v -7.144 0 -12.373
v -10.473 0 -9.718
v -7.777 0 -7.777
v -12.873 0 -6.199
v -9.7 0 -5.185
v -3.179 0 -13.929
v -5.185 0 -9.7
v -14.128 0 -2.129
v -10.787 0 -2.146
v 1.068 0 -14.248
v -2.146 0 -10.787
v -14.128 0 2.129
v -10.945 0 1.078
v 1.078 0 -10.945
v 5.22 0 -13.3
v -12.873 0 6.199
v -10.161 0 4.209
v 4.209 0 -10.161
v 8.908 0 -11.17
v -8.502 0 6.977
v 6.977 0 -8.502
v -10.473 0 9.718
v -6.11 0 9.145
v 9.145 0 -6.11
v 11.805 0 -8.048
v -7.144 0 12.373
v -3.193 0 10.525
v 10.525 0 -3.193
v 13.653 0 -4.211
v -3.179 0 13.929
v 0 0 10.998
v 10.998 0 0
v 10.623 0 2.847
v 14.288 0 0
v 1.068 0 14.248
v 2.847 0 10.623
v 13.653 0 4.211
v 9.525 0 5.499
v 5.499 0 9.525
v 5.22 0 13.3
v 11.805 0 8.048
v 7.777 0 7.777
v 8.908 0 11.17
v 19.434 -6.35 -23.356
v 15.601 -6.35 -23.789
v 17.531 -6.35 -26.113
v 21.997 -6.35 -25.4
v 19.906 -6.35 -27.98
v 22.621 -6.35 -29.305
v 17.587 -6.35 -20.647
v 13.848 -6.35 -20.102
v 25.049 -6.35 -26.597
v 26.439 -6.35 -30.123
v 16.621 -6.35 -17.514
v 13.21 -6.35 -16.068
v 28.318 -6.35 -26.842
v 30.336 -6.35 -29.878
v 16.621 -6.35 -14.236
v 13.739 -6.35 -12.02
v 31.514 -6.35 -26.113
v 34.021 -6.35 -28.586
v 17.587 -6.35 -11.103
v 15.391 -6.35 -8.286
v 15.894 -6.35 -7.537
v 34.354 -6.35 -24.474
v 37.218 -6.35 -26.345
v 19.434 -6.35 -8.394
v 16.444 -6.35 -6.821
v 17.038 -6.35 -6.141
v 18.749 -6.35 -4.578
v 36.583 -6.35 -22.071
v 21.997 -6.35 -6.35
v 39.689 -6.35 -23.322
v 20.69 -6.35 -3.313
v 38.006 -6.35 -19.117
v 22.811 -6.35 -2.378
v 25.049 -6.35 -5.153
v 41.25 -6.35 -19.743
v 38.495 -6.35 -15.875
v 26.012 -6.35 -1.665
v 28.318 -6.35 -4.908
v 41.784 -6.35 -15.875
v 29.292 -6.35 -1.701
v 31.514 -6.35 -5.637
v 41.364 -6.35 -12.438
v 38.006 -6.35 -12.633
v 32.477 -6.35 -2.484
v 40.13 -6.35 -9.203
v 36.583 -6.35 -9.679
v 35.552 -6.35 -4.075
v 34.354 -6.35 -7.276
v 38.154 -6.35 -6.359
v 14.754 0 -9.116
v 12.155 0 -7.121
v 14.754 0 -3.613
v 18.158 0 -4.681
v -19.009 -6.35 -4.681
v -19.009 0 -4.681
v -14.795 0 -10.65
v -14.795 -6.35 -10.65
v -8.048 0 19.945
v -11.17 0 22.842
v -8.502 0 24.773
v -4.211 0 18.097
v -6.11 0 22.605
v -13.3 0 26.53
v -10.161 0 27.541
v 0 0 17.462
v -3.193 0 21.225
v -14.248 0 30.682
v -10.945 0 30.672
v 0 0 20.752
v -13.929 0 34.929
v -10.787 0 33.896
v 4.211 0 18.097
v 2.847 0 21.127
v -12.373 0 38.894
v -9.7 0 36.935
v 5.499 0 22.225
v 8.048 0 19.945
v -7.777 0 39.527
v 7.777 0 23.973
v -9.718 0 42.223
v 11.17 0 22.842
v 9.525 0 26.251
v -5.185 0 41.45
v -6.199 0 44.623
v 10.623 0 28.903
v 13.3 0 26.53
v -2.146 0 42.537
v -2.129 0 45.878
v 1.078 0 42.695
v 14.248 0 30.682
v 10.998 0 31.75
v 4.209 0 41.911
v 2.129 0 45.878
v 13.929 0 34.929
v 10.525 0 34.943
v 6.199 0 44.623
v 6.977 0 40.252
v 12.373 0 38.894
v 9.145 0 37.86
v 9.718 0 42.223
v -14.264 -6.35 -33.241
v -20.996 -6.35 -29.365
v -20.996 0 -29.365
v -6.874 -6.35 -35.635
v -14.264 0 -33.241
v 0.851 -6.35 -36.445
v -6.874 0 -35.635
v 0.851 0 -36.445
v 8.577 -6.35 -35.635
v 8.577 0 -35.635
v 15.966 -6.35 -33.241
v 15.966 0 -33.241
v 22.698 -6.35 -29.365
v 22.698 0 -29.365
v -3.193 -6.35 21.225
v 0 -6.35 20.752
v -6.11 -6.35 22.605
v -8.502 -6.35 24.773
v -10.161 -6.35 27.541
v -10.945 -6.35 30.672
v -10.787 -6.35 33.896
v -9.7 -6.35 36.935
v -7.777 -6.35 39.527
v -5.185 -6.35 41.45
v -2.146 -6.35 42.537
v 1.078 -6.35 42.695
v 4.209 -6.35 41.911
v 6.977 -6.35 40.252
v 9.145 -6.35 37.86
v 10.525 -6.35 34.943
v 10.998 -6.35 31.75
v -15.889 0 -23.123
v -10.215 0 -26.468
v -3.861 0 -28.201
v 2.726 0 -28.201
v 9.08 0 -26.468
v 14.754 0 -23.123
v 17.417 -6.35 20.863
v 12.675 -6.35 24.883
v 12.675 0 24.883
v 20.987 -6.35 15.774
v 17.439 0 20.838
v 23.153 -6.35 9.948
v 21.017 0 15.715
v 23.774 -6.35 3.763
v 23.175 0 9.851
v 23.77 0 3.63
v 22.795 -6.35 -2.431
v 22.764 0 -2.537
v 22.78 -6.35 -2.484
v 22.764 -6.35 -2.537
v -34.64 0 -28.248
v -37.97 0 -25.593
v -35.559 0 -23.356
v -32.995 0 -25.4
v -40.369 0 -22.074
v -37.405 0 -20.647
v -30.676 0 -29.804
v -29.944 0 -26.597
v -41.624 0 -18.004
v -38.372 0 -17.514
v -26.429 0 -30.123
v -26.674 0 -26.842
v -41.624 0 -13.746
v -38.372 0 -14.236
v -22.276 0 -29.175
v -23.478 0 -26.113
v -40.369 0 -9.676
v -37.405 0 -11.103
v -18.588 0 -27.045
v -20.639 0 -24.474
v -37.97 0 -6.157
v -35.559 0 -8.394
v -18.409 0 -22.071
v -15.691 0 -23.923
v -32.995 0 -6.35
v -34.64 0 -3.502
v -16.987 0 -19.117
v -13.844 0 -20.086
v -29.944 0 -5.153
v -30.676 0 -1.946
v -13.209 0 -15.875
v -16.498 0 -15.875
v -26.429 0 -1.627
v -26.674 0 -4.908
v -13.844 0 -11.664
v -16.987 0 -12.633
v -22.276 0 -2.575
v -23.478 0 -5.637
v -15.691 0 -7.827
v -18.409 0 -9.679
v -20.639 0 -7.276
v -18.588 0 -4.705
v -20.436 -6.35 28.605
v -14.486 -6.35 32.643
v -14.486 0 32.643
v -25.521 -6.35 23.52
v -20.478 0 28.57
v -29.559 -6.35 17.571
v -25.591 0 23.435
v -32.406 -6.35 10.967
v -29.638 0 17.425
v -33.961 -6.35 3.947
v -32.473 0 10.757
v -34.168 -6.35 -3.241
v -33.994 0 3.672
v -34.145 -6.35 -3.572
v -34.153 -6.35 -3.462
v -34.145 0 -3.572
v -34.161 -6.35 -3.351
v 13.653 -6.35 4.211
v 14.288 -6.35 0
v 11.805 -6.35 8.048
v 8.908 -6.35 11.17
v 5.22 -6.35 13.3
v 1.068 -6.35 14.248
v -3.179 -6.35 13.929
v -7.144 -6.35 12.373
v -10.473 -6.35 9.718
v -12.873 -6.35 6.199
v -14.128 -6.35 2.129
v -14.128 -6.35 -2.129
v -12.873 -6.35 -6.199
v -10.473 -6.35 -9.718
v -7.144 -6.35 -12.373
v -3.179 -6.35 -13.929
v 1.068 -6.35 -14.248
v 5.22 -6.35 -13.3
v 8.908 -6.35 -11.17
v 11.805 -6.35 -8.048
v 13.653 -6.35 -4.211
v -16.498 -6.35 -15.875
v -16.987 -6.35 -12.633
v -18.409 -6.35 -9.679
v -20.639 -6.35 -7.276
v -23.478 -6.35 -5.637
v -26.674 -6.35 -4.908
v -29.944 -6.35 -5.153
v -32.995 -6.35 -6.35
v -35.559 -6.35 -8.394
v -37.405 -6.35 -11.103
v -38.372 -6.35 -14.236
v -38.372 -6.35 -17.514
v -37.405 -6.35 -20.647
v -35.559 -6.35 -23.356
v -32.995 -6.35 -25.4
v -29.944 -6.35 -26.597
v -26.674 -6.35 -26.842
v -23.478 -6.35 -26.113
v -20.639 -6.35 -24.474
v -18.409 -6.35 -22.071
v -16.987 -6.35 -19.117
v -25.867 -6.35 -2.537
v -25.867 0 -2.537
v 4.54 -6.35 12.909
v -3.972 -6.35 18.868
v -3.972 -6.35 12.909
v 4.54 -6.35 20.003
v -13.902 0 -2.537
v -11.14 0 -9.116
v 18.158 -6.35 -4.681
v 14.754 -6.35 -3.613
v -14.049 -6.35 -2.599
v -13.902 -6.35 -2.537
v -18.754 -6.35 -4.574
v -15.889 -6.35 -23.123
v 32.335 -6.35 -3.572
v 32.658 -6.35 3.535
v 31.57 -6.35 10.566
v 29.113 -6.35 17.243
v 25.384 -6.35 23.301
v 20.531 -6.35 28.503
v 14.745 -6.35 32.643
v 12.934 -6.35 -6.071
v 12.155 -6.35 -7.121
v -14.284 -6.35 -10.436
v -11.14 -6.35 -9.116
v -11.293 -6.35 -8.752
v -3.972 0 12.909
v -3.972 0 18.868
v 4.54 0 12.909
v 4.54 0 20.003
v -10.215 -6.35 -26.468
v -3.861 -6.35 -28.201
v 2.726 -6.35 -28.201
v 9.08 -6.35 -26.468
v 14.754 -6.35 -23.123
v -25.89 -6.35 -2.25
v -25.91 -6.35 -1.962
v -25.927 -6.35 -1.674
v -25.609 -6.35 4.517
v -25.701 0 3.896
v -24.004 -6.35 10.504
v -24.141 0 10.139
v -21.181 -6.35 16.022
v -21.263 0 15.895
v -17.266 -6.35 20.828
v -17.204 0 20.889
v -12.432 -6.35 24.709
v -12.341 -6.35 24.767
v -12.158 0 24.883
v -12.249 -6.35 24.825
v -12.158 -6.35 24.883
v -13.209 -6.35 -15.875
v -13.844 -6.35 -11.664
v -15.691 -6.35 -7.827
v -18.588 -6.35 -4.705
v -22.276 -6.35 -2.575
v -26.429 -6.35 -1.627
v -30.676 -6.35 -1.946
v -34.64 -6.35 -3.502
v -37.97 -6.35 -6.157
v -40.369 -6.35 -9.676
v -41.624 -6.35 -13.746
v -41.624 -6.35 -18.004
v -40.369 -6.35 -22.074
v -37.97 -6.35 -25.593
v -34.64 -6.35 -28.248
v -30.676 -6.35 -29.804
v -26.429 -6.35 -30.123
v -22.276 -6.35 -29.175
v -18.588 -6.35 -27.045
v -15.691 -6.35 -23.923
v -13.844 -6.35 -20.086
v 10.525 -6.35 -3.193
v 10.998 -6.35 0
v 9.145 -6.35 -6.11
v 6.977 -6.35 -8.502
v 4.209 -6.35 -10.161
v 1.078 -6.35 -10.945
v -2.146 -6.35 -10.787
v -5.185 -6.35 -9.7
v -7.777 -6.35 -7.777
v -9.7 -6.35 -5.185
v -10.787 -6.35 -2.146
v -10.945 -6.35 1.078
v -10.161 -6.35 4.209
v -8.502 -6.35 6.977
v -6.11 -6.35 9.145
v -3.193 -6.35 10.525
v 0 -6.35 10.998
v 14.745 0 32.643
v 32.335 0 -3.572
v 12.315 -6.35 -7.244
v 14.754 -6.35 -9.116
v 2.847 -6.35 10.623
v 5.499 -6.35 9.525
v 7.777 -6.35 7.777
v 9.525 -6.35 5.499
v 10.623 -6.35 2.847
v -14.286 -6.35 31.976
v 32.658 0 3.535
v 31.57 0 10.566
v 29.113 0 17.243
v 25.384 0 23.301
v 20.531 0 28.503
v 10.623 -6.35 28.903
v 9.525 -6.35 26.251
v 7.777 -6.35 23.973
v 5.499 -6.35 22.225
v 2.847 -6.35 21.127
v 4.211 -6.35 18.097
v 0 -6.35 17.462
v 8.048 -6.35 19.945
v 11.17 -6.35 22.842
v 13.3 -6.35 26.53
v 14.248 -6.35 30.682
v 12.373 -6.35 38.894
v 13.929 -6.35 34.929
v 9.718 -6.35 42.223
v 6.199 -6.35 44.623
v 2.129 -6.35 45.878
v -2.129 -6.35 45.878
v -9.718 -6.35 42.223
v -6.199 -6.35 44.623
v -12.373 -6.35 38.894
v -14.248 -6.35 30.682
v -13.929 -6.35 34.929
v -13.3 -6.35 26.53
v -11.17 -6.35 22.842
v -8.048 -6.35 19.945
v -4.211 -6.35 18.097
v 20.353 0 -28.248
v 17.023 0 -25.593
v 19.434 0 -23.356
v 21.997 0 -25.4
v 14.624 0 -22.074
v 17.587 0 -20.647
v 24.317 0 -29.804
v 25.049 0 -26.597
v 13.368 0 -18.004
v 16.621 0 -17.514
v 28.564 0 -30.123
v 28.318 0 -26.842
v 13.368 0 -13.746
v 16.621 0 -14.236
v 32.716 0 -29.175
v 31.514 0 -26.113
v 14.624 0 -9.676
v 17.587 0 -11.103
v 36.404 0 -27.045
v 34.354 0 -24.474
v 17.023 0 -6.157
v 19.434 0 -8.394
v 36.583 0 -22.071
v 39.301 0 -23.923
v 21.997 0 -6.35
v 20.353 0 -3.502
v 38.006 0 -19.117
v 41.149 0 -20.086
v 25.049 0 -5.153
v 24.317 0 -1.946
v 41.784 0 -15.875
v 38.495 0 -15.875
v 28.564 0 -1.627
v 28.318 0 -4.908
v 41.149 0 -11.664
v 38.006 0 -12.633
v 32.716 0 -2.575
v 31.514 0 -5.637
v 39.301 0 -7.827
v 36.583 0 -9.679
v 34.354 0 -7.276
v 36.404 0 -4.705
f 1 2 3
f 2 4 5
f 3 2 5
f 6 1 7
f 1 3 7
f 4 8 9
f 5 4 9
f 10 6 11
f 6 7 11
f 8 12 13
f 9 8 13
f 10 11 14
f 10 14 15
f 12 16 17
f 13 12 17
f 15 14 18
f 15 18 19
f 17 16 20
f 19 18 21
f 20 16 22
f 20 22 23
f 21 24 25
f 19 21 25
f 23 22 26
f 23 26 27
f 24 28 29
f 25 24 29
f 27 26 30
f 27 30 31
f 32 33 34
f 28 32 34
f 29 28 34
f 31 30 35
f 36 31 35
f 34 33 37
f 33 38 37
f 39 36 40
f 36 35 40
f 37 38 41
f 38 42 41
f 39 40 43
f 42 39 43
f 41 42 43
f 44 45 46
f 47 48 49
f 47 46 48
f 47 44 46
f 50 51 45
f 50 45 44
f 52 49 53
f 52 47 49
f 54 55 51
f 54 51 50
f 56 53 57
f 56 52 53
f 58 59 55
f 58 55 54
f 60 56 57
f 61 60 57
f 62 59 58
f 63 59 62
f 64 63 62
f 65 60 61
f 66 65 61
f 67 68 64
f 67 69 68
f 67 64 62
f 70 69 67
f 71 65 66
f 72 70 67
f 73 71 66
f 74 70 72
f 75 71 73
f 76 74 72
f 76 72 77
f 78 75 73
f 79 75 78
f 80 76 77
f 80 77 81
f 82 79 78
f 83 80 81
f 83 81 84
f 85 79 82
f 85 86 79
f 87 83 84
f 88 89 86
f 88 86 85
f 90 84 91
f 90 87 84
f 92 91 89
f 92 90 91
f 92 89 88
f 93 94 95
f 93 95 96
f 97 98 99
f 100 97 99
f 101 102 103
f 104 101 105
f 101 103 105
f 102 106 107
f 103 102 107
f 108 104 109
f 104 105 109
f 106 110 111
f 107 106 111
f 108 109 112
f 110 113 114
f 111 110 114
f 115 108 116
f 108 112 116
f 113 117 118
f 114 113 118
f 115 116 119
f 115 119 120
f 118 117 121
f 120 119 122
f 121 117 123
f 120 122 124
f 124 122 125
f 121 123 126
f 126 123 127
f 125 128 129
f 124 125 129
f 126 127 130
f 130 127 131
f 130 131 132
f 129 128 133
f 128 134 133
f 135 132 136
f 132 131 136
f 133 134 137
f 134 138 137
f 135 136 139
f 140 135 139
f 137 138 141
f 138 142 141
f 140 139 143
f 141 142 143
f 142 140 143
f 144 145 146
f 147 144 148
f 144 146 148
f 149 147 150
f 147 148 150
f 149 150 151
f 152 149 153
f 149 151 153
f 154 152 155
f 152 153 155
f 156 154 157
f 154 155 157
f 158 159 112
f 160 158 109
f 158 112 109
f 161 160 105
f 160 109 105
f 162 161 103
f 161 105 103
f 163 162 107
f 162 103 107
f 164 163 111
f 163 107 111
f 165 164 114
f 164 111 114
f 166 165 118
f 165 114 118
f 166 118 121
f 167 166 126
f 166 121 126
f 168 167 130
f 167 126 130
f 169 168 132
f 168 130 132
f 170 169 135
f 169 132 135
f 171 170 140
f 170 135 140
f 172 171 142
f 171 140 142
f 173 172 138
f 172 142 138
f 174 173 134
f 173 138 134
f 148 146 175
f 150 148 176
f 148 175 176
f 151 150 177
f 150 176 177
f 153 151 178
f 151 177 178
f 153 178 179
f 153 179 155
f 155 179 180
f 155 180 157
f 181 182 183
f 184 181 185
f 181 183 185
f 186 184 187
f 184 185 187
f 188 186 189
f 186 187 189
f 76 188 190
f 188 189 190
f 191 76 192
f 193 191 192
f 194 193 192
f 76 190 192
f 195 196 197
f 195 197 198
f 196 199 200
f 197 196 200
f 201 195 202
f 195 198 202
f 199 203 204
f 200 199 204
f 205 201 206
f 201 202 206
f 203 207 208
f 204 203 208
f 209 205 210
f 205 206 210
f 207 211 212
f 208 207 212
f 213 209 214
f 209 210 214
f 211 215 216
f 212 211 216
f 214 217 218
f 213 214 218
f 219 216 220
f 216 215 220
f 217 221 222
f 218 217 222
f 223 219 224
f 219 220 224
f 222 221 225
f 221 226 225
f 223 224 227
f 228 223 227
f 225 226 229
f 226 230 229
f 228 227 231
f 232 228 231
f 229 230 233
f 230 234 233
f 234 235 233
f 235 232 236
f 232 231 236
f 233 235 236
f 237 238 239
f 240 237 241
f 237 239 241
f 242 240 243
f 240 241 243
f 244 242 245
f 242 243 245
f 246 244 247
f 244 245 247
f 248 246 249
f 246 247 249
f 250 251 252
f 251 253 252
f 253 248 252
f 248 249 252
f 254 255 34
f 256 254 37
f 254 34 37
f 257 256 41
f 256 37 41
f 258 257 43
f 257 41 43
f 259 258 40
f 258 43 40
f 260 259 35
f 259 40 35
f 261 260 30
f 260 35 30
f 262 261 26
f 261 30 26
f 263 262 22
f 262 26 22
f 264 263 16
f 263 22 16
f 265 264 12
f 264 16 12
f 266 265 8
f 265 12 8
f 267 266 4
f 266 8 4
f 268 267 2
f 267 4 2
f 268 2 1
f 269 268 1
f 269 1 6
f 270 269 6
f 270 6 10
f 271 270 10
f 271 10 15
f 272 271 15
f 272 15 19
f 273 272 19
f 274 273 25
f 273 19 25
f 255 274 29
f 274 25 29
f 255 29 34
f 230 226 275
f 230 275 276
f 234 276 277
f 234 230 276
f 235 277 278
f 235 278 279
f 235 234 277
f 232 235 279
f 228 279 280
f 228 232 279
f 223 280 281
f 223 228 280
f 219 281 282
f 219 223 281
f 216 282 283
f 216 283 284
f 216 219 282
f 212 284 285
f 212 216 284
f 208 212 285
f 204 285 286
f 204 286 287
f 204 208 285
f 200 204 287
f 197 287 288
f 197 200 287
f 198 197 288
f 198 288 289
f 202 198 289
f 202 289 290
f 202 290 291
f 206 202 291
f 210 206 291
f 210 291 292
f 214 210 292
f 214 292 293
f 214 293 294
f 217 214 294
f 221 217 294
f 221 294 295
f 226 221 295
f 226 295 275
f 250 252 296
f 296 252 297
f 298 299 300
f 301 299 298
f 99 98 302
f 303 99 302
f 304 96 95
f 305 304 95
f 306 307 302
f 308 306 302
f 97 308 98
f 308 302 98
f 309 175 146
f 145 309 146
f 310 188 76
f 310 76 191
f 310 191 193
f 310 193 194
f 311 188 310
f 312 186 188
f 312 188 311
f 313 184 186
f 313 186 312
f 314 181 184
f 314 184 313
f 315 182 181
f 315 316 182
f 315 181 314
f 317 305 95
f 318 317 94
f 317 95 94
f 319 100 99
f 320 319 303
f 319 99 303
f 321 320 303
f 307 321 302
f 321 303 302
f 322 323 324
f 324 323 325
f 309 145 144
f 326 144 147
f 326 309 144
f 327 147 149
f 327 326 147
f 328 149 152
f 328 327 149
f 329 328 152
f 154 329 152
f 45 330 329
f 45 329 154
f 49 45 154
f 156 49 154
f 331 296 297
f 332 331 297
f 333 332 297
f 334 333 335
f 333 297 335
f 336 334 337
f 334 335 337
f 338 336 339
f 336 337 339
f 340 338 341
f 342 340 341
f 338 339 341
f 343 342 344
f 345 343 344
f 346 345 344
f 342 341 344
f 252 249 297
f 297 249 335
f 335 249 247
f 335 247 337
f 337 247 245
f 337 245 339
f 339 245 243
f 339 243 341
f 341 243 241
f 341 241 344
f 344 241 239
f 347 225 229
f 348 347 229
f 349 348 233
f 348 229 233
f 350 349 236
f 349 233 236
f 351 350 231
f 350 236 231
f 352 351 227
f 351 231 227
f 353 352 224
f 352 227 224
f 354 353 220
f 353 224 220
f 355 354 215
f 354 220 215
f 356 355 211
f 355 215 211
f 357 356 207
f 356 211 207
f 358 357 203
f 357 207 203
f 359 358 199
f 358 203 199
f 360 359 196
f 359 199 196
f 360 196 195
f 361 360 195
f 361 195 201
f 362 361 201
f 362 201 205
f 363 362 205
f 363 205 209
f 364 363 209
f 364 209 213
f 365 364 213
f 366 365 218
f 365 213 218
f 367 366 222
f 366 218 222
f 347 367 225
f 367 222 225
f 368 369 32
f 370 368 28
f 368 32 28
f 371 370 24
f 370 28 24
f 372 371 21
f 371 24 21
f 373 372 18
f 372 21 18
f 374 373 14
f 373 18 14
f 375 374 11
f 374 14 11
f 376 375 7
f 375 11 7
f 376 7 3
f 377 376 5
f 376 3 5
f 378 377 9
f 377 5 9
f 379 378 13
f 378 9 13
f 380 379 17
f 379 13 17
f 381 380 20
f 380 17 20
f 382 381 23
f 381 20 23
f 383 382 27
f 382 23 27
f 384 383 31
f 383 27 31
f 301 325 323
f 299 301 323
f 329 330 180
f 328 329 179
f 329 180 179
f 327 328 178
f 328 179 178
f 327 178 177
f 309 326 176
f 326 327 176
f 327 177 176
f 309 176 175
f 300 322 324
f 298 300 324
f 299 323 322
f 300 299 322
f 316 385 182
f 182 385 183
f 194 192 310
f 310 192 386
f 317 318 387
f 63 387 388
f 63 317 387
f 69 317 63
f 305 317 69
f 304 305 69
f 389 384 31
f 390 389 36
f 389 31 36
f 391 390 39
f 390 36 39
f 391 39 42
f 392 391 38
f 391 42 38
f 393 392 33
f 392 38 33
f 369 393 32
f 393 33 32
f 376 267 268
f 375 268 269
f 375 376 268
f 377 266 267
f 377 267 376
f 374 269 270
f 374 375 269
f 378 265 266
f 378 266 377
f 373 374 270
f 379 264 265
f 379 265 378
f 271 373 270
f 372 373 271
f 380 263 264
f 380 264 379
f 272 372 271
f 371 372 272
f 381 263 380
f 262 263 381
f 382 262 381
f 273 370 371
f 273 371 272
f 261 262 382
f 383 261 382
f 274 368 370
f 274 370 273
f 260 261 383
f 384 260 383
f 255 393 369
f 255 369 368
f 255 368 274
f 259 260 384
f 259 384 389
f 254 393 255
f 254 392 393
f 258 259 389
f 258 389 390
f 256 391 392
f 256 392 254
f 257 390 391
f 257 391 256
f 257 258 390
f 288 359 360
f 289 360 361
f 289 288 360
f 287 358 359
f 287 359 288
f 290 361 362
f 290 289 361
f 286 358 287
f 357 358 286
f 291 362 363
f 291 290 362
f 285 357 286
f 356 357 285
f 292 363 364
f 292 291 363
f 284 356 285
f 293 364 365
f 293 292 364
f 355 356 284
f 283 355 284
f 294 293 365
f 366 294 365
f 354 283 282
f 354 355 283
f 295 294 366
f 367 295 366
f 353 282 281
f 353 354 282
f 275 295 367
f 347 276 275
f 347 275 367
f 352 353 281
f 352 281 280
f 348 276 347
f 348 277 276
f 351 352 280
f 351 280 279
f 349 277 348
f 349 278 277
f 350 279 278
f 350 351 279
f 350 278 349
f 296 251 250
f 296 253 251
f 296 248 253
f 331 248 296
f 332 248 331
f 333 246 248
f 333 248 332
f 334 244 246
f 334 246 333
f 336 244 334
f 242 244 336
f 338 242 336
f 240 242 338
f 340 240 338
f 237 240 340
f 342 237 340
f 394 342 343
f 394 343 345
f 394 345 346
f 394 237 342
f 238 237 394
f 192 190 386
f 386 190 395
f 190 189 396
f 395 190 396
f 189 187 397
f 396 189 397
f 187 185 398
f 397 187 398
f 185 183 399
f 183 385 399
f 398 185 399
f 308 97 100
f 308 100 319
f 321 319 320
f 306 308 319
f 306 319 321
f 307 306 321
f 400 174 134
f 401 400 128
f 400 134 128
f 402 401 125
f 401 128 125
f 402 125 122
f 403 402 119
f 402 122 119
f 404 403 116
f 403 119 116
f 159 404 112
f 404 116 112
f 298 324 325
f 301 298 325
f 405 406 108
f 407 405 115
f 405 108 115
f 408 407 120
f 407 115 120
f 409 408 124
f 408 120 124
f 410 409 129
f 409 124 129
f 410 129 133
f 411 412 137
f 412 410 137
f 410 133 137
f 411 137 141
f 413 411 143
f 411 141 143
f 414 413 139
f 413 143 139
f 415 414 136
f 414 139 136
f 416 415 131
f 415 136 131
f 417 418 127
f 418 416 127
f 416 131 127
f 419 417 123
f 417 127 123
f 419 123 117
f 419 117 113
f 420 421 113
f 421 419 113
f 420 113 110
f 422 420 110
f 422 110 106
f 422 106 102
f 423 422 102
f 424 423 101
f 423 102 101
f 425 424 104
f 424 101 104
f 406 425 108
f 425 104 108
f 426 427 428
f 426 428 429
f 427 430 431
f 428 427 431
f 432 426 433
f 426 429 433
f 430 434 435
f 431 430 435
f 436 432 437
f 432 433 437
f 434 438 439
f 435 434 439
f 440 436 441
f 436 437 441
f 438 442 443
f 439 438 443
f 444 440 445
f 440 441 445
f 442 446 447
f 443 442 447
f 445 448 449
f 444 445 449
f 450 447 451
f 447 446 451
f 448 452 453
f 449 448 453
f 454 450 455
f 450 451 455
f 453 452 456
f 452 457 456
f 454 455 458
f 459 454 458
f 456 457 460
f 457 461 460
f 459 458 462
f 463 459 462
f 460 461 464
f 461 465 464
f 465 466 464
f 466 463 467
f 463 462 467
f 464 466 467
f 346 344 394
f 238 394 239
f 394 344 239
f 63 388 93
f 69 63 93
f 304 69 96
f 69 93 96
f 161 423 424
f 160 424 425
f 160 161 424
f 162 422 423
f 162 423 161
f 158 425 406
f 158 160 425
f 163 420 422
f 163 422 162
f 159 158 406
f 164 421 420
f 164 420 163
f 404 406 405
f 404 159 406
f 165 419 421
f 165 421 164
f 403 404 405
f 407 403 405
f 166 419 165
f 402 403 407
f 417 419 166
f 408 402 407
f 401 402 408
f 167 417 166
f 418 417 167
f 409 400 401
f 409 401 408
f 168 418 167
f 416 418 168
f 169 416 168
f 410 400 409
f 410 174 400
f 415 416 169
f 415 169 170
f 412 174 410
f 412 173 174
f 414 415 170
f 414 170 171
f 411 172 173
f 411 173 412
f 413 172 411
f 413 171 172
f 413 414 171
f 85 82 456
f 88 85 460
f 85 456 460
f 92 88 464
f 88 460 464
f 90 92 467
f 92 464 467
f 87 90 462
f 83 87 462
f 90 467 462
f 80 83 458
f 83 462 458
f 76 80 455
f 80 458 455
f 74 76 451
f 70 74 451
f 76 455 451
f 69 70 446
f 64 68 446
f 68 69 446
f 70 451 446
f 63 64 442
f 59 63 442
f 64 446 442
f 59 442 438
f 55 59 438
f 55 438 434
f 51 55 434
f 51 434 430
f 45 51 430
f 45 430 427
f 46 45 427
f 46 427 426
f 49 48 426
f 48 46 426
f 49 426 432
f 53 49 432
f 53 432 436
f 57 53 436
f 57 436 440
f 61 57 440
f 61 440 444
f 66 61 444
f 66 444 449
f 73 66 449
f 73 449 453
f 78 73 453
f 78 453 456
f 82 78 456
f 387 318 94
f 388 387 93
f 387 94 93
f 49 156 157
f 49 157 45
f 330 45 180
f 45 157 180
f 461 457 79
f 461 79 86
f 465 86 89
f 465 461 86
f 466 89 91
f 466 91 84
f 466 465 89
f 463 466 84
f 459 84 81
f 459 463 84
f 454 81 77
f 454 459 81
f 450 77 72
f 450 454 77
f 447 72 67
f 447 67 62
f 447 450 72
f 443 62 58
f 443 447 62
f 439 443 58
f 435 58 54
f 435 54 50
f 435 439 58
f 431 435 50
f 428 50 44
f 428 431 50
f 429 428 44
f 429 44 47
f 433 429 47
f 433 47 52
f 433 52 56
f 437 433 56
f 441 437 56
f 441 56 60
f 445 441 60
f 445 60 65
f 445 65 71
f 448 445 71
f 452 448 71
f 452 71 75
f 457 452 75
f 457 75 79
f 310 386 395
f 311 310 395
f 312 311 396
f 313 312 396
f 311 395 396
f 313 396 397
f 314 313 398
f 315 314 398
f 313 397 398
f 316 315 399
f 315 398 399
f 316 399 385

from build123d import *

# Parameters (mm, degrees)
F2_DEPTH    = 25.4
F0_R        = 14.2875
F0_R_2      = 10.9982
F2_FACE_R   = 14.2875
F2_FACE_R_2 = 10.9982
F3_DEPTH    = 19.05


with BuildPart() as f2:
    # F1 (on Front) → F2 (new body)
    with BuildSketch(Plane.XZ):
        with BuildLine():
            Line((-12.1575798839, 24.8825736344), (-14.4856730476, 32.6428860426))
            ThreePointArc((-14.4856730476, 32.6428860426), (-29.6381251767, 17.4249747886), (-34.1451242566, -3.5718961153))
            Line((-34.1451242566, -3.5718961153), (-25.8674621582, -2.5371881202))
            ThreePointArc((-25.8674621582, -2.5371881202), (-22.8596873169, 13.096276101), (-12.1575798839, 24.8825736344))
        make_face()
    extrude(amount=F2_DEPTH)


with BuildPart() as f2b:
    # F1 (on Front) → F2, piece 2 (new body)
    with BuildSketch(Plane.XZ):
        with BuildLine():
            ThreePointArc((12.6754119992, 24.8825736344), (22.2850246185, 12.8524195086), (22.7638147771, -2.5371881202))
            Line((22.7638147771, -2.5371881202), (32.3348678648, -3.5718961153))
            ThreePointArc((32.3348678648, -3.5718961153), (29.1131255688, 17.2425161523), (14.7448275238, 32.6428860426))
            Line((14.7448275238, 32.6428860426), (12.6754119992, 24.8825736344))
        make_face()
    extrude(amount=F2_DEPTH)


with BuildPart() as f2c:
    # F1 (on Front) → F2, piece 3 (new body)
    with BuildSketch(Plane.XZ):
        Polygon((18.1582998484, -4.681436345), (14.7536145523, -3.6133122598), (12.1554992524, -7.1213860189), (14.7536145523, -9.1160812369), align=None)
    extrude(amount=F2_DEPTH)


with BuildPart() as f2d:
    # F1 (on Front) → F2, piece 4 (new body)
    with BuildSketch(Plane.XZ):
        Polygon((4.5395721681, 20.0025010854), (-3.9721252397, 18.8676062971), (-3.9721252397, 12.909415178), (4.5395721681, 12.909415178), align=None)
    extrude(amount=F2_DEPTH)


with BuildPart() as f2e:
    # F1 (on Front) → F2, piece 5 (new body)
    with BuildSketch(Plane.XZ):
        Polygon((-13.9024481177, -2.5371881202), (-19.009469077, -4.681436345), (-14.7945646839, -10.6504065937), (-11.1402154974, -9.1160812369), align=None)
    extrude(amount=F2_DEPTH)


with BuildPart() as f2f:
    # F1 (on Front) → F2, piece 6 (new body)
    with BuildSketch(Plane.XZ):
        with BuildLine():
            ThreePointArc((14.7536145523, -23.1234580278), (-0.5674478598, -28.4201810934), (-15.8885102719, -23.1234580278))
            Line((-15.8885102719, -23.1234580278), (-20.9955312312, -29.3653719127))
            ThreePointArc((-20.9955312312, -29.3653719127), (0.8511710912, -36.4453007575), (22.6978734136, -29.3653719127))
            Line((22.6978734136, -29.3653719127), (14.7536145523, -23.1234580278))
        make_face()
    extrude(amount=F2_DEPTH)


with BuildPart() as f2g:
    # F0 (on Front) → F2, piece 7 (new body)
    with BuildSketch(Plane.XZ):
        with Locations((27.4963065702, -15.875)):
            Circle(F0_R)
        with Locations((27.4963065702, -15.875)):
            Circle(F0_R_2, mode=Mode.SUBTRACT)
    extrude(amount=F2_DEPTH)


with BuildPart() as f2h:
    # F0 (on Front) → F2, piece 8 (new body)
    with BuildSketch(Plane.XZ):
        with BuildLine():
            ThreePointArc((0, 14.2875), (-10.1027881362, -10.1027881362), (14.2875, 0))
            ThreePointArc((14.2875, 0), (10.1027881362, 10.1027881362), (0, 14.2875))
        make_face()
        with BuildLine():
            ThreePointArc((10.9982, 0), (-7.7769018008, -7.7769018008), (0, 10.9982))
            ThreePointArc((0, 10.9982), (7.7769018008, 7.7769018008), (10.9982, 0))
        make_face(mode=Mode.SUBTRACT)
    extrude(amount=F2_DEPTH)


with BuildPart() as f2i:
    # F0 (on Front) → F2, piece 9 (new body)
    with BuildSketch(Plane.XZ):
        with BuildLine():
            ThreePointArc((14.2875, 31.75), (-10.1027881362, 41.8527881362), (0, 17.4625))
            ThreePointArc((0, 17.4625), (10.1027881362, 21.6472118638), (14.2875, 31.75))
        make_face()
        with BuildLine():
            ThreePointArc((10.9982, 31.75), (7.7769018008, 23.9730981992), (0, 20.7518))
            ThreePointArc((0, 20.7518), (-7.7769018008, 39.5269018008), (10.9982, 31.75))
        make_face(mode=Mode.SUBTRACT)
    extrude(amount=F2_DEPTH)


with BuildPart() as f2j:
    # F0 (on Front) → F2, piece 10 (new body)
    with BuildSketch(Plane.XZ):
        with Locations((-27.4963065702, -15.875)):
            Circle(F0_R)
        with Locations((-27.4963065702, -15.875)):
            Circle(F0_R_2, mode=Mode.SUBTRACT)
    extrude(amount=F2_DEPTH)


with BuildPart() as f3_tool:
    # F2_face (on face) → F3 (new body)
    with BuildSketch(Plane(origin=(-24.9404364101, -25.4, 14.3906853259), x_dir=(1, 0, 0), z_dir=(0, -1, 0))):
        with BuildLine():
            ThreePointArc((-0.9270257481, -16.9278734461), (2.0807490932, -1.2944092249), (12.7828565261, 10.4918883085))
            Line((12.7828565261, 10.4918883085), (10.4547633625, 18.2522007167))
            ThreePointArc((10.4547633625, 18.2522007167), (-4.6976887667, 3.0342894627), (-9.2046878465, -17.9625814412))
            Line((-9.2046878465, -17.9625814412), (-0.9270257481, -16.9278734461))
        make_face()
        with Locations((-2.5558701601, -30.2656853259)):
            Circle(F2_FACE_R)
        with Locations((-2.5558701601, -30.2656853259)):
            Circle(F2_FACE_R_2, mode=Mode.SUBTRACT)
        with Locations((24.9404364101, -14.3906853259)):
            Circle(F2_FACE_R)
        with Locations((24.9404364101, -14.3906853259)):
            Circle(F2_FACE_R_2, mode=Mode.SUBTRACT)
        Polygon((10.1458717262, -25.0410919196), (13.8002209127, -23.5067665627), (11.0379882923, -16.9278734461), (5.9309673331, -19.0721216709), align=None)
        with BuildLine():
            ThreePointArc((39.6940509624, -37.5141433537), (24.3729885503, -42.8108664193), (9.0519261382, -37.5141433537))
            Line((9.0519261382, -37.5141433537), (3.9449051789, -43.7560572386))
            ThreePointArc((3.9449051789, -43.7560572386), (25.7916075013, -50.8359860834), (47.6383098236, -43.7560572386))
            Line((47.6383098236, -43.7560572386), (39.6940509624, -37.5141433537))
        make_face()
        with Locations((52.4367429802, -30.2656853259)):
            Circle(F2_FACE_R)
        with Locations((52.4367429802, -30.2656853259)):
            Circle(F2_FACE_R_2, mode=Mode.SUBTRACT)
        Polygon((39.6940509624, -23.5067665627), (43.0987362585, -19.0721216709), (39.6940509624, -18.0039975857), (37.0959356624, -21.5120713448), align=None)
        with Locations((24.9404364101, 17.3593146741)):
            Circle(F2_FACE_R)
        with Locations((24.9404364101, 17.3593146741)):
            Circle(F2_FACE_R_2, mode=Mode.SUBTRACT)
        Polygon((29.4800085782, 5.6118157595), (20.9683111704, 4.4769209713), (20.9683111704, -1.4812701479), (29.4800085782, -1.4812701479), align=None)
        with BuildLine():
            Line((39.6852639339, 18.2522007167), (37.6158484093, 10.4918883085))
            ThreePointArc((37.6158484093, 10.4918883085), (47.2254610285, -1.5382658173), (47.7042511872, -16.9278734461))
            Line((47.7042511872, -16.9278734461), (57.2753042749, -17.9625814412))
            ThreePointArc((57.2753042749, -17.9625814412), (54.0535619789, 2.8518308264), (39.6852639339, 18.2522007167))
        make_face()
    extrude(amount=-F3_DEPTH)


with BuildPart() as f2_1:
    add(f2.part)

    # F3: cut by f3_tool
    add(f3_tool.part, mode=Mode.SUBTRACT)


with BuildPart() as f2b_1:
    add(f2b.part)

    # F3: cut by f3_tool
    add(f3_tool.part, mode=Mode.SUBTRACT)


with BuildPart() as f2c_1:
    add(f2c.part)

    # F3: cut by f3_tool
    add(f3_tool.part, mode=Mode.SUBTRACT)


with BuildPart() as f2d_1:
    add(f2d.part)

    # F3: cut by f3_tool
    add(f3_tool.part, mode=Mode.SUBTRACT)


with BuildPart() as f2e_1:
    add(f2e.part)

    # F3: cut by f3_tool
    add(f3_tool.part, mode=Mode.SUBTRACT)


with BuildPart() as f2f_1:
    add(f2f.part)

    # F3: cut by f3_tool
    add(f3_tool.part, mode=Mode.SUBTRACT)


with BuildPart() as f2g_1:
    add(f2g.part)

    # F3: cut by f3_tool
    add(f3_tool.part, mode=Mode.SUBTRACT)


with BuildPart() as f2h_1:
    add(f2h.part)

    # F3: cut by f3_tool
    add(f3_tool.part, mode=Mode.SUBTRACT)


with BuildPart() as f2i_1:
    add(f2i.part)

    # F3: cut by f3_tool
    add(f3_tool.part, mode=Mode.SUBTRACT)


with BuildPart() as f2j_1:
    add(f2j.part)

    # F3: cut by f3_tool
    add(f3_tool.part, mode=Mode.SUBTRACT)


solid = Compound([f2_1.part, f2b_1.part, f2c_1.part, f2d_1.part, f2e_1.part, f2f_1.part, f2g_1.part, f2h_1.part, f2i_1.part, f2j_1.part])
